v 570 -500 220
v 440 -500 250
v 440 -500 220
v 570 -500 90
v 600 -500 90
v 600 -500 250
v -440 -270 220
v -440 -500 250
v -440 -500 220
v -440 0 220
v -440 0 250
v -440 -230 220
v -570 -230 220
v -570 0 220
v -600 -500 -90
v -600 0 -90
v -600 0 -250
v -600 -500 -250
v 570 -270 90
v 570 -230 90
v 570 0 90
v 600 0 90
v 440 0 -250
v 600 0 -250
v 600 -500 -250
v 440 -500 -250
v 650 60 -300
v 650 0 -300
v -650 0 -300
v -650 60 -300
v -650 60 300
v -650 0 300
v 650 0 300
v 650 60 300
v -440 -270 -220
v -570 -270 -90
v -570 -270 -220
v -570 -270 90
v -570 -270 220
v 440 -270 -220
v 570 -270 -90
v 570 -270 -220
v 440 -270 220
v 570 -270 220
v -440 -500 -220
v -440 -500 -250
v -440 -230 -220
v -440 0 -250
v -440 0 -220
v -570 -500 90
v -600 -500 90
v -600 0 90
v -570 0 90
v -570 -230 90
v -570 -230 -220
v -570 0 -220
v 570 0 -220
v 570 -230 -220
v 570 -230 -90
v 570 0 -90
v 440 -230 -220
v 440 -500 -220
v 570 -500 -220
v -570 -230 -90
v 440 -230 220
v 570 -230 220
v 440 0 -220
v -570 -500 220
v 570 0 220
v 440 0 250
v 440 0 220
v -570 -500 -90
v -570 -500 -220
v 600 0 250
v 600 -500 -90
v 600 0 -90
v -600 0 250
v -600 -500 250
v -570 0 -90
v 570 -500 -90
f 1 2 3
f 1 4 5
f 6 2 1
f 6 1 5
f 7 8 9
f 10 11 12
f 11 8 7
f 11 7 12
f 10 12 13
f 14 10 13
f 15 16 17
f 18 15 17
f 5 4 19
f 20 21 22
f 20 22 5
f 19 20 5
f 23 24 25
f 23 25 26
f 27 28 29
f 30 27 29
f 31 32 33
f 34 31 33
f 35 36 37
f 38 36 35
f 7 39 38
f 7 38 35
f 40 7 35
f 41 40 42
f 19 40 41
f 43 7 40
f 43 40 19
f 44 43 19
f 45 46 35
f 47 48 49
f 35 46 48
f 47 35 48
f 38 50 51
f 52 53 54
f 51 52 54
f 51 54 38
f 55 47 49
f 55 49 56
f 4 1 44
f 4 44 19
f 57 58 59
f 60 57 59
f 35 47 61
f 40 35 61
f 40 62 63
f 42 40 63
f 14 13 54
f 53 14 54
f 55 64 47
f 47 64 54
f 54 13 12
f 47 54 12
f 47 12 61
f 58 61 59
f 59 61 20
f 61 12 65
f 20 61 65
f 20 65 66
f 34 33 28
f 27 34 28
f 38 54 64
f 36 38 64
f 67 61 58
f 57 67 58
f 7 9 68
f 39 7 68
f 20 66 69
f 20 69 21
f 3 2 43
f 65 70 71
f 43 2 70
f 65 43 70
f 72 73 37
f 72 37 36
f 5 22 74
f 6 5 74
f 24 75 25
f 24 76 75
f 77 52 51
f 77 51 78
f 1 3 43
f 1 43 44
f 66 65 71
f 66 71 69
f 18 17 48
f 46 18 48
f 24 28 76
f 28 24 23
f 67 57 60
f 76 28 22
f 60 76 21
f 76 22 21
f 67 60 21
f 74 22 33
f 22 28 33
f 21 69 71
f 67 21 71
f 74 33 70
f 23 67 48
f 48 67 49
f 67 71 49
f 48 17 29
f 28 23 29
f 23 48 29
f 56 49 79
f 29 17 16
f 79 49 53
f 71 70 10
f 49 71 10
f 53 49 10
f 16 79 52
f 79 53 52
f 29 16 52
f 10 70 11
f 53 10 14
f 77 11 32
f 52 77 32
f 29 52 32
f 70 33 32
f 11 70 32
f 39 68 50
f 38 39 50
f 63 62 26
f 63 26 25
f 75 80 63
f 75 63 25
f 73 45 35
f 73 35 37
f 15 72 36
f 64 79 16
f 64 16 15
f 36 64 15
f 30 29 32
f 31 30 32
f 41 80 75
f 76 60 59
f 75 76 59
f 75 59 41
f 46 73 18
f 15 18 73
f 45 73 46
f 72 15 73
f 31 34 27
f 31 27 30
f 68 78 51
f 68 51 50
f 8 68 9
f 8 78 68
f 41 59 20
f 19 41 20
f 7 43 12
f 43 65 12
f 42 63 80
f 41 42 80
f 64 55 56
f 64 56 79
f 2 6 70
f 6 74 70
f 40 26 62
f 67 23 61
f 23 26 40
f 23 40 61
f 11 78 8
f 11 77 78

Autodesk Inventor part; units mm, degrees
ref_plane "YZ Plane" through (0, 0, 0) normal (1, 0, 0) x (0, 1, 0)
sketch "Sketch1" plane through (0, 0, 0) normal (0, 1, 0) x (-1, 0, 0)
  line L0 (-650, -300) -> (650, -300)
  line L1 (650, -300) -> (650, 300)
  line L2 (650, 300) -> (-650, 300)
  line L3 (-650, 300) -> (-650, -300)
  line L4 (-650, -300) -> (650, 300) construction
  line L5 (650, -300) -> (-650, 300) construction
  line L6 (650, 300) -> (600, 300)
  line L7 (600, 250) -> (570, 250)
  line L8 (570, 220) -> (570, 90)
  line L9 (570, 90) -> (600, 90)
  line L10 (600, 90) -> (600, 250)
  line L11 (600, 250) -> (440, 250)
  line L12 (440, 250) -> (440, 220)
  line L13 (440, 220) -> (570, 220)
  line L14 (600, 220) -> (600, 250)
  line L15 (650, -300) -> (600, -300)
  line L16 (650, -250) -> (650, -300)
  line L17 (600, -250) -> (440, -250)
  line L18 (440, -250) -> (440, -220)
  line L19 (440, -220) -> (570, -220)
  line L20 (600, -220) -> (600, -250)
  line L21 (600, -250) -> (570, -250)
  line L22 (570, -220) -> (570, -90)
  line L23 (570, -90) -> (600, -90)
  line L24 (600, -90) -> (600, -250)
  line L25 (-650, 300) -> (-600, 300)
  line L26 (-650, 250) -> (-650, 300)
  line L27 (-600, 250) -> (-570, 250)
  line L28 (-570, 220) -> (-570, 90)
  line L29 (-570, 90) -> (-600, 90)
  line L30 (-600, 90) -> (-600, 250)
  line L31 (-600, 250) -> (-440, 250)
  line L32 (-440, 250) -> (-440, 220)
  line L33 (-440, 220) -> (-570, 220)
  line L34 (-600, 220) -> (-600, 250)
  line L35 (-650, -300) -> (-600, -300)
  line L36 (-650, -250) -> (-650, -300)
  line L37 (-600, -250) -> (-440, -250)
  line L38 (-440, -250) -> (-440, -220)
  line L39 (-440, -220) -> (-570, -220)
  line L40 (-600, -220) -> (-600, -250)
  line L41 (-600, -250) -> (-570, -250)
  line L42 (-570, -220) -> (-570, -90)
  line L43 (-570, -90) -> (-600, -90)
  line L44 (-600, -90) -> (-600, -250)
  point P0 (0, 0)
  dimension "d0" = 1300
  dimension "d1" = 600
  dimension "d4" = 30
  dimension "d5" = 160
  dimension "d6" = 30
  dimension "d7" = 50
  dimension "d8" = 50
  dimension "d9" = 50
  dimension "d10" = 50
  dimension "d11" = 30
  dimension "d12" = 160
  dimension "d13" = 160
  dimension "d14" = 30
extrude "Extrusion1" add sketch "Sketch1" along normal blind 60 contours L3 L2 L1 L0 | L10 L9 L8 L13 L12 L11 L7 | L17 L18 L19 L22 L23 L24 L20 | L27 L31 L32 L33 L28 L29 L30 | L40 L44 L43 L42 L39 L38 L37
ref_plane "Work Plane1" through (0, 0, 0) normal (0, -1, 0) x (1, 0, 0)
sketch "Sketch2" plane through (0, 0, 0) normal (0, -1, 0) x (1, 0, 0)
  line L0 (650, 300) -> (650, -300) projected
  line L1 (650, 300) -> (600, 300)
  line L2 (650, 250) -> (650, 300)
  line L3 (650, -300) -> (600, -300)
  line L4 (650, -250) -> (650, -300)
  line L5 (-650, -300) -> (-650, 300) projected
  line L6 (-650, -300) -> (-600, -300)
  line L7 (-650, -250) -> (-650, -300)
  line L8 (-650, 300) -> (-600, 300)
  line L9 (-650, 250) -> (-650, 300)
  line L10 (-600, -250) -> (-440, -250)
  line L11 (-440, -250) -> (-440, -220)
  line L12 (-440, -220) -> (-570, -220)
  line L13 (-600, -220) -> (-600, -250)
  line L14 (-600, -250) -> (-570, -250)
  line L15 (-570, -220) -> (-570, -90)
  line L16 (-570, -90) -> (-600, -90)
  line L17 (-600, -90) -> (-600, -250)
  line L18 (-600, 250) -> (-440, 250)
  line L19 (-440, 250) -> (-440, 220)
  line L20 (-440, 220) -> (-570, 220)
  line L21 (-600, 220) -> (-600, 250)
  line L22 (-600, 250) -> (-570, 250)
  line L23 (-570, 220) -> (-570, 90)
  line L24 (-570, 90) -> (-600, 90)
  line L25 (-600, 90) -> (-600, 250)
  line L26 (600, -250) -> (440, -250)
  line L27 (440, -250) -> (440, -220)
  line L28 (440, -220) -> (570, -220)
  line L29 (600, -220) -> (600, -250)
  line L30 (600, -250) -> (570, -250)
  line L31 (570, -220) -> (570, -90)
  line L32 (570, -90) -> (600, -90)
  line L33 (600, -90) -> (600, -250)
  line L34 (600, 250) -> (570, 250)
  line L35 (570, 220) -> (570, 90)
  line L36 (570, 90) -> (600, 90)
  line L37 (600, 90) -> (600, 250)
  line L38 (600, 250) -> (440, 250)
  line L39 (440, 250) -> (440, 220)
  line L40 (440, 220) -> (570, 220)
  line L41 (600, 220) -> (600, 250)
  point P0 (0, 0)
  dimension "d18" = 50
  dimension "d19" = 50
  dimension "d20" = 50
  dimension "d21" = 50
  dimension "d22" = 50
  dimension "d23" = 50
  dimension "d24" = 50
  dimension "d25" = 50
  dimension "d26" = 160
  dimension "d27" = 30
  dimension "d28" = 30
  dimension "d29" = 160
  dimension "d30" = 160
  dimension "d31" = 30
  dimension "d32" = 30
  dimension "d33" = 160
  dimension "d34" = 160
  dimension "d35" = 30
  dimension "d36" = 30
  dimension "d37" = 160
extrude "Extrusion2" add sketch "Sketch2" along normal blind 500
ref_plane "Work Plane2" through (0, -250, 0) normal (0, -1, 0) x (1, 0, 0)
sketch "Sketch3" plane through (0, -250, 0) normal (0, -1, 0) x (1, 0, 0)
  line L0 (570, 220) -> (-570, 220)
  line L1 (-570, 220) -> (-570, -220)
  line L2 (-570, -220) -> (570, -220)
  line L3 (570, -220) -> (570, 220)
  point P0 (0, 0)
extrude "Extrusion3" add sketch "Sketch3" along normal blind 20 and the other way blind 20
properties part number "Sto u dnevnoj sobi" material "Wood (Birch)"
